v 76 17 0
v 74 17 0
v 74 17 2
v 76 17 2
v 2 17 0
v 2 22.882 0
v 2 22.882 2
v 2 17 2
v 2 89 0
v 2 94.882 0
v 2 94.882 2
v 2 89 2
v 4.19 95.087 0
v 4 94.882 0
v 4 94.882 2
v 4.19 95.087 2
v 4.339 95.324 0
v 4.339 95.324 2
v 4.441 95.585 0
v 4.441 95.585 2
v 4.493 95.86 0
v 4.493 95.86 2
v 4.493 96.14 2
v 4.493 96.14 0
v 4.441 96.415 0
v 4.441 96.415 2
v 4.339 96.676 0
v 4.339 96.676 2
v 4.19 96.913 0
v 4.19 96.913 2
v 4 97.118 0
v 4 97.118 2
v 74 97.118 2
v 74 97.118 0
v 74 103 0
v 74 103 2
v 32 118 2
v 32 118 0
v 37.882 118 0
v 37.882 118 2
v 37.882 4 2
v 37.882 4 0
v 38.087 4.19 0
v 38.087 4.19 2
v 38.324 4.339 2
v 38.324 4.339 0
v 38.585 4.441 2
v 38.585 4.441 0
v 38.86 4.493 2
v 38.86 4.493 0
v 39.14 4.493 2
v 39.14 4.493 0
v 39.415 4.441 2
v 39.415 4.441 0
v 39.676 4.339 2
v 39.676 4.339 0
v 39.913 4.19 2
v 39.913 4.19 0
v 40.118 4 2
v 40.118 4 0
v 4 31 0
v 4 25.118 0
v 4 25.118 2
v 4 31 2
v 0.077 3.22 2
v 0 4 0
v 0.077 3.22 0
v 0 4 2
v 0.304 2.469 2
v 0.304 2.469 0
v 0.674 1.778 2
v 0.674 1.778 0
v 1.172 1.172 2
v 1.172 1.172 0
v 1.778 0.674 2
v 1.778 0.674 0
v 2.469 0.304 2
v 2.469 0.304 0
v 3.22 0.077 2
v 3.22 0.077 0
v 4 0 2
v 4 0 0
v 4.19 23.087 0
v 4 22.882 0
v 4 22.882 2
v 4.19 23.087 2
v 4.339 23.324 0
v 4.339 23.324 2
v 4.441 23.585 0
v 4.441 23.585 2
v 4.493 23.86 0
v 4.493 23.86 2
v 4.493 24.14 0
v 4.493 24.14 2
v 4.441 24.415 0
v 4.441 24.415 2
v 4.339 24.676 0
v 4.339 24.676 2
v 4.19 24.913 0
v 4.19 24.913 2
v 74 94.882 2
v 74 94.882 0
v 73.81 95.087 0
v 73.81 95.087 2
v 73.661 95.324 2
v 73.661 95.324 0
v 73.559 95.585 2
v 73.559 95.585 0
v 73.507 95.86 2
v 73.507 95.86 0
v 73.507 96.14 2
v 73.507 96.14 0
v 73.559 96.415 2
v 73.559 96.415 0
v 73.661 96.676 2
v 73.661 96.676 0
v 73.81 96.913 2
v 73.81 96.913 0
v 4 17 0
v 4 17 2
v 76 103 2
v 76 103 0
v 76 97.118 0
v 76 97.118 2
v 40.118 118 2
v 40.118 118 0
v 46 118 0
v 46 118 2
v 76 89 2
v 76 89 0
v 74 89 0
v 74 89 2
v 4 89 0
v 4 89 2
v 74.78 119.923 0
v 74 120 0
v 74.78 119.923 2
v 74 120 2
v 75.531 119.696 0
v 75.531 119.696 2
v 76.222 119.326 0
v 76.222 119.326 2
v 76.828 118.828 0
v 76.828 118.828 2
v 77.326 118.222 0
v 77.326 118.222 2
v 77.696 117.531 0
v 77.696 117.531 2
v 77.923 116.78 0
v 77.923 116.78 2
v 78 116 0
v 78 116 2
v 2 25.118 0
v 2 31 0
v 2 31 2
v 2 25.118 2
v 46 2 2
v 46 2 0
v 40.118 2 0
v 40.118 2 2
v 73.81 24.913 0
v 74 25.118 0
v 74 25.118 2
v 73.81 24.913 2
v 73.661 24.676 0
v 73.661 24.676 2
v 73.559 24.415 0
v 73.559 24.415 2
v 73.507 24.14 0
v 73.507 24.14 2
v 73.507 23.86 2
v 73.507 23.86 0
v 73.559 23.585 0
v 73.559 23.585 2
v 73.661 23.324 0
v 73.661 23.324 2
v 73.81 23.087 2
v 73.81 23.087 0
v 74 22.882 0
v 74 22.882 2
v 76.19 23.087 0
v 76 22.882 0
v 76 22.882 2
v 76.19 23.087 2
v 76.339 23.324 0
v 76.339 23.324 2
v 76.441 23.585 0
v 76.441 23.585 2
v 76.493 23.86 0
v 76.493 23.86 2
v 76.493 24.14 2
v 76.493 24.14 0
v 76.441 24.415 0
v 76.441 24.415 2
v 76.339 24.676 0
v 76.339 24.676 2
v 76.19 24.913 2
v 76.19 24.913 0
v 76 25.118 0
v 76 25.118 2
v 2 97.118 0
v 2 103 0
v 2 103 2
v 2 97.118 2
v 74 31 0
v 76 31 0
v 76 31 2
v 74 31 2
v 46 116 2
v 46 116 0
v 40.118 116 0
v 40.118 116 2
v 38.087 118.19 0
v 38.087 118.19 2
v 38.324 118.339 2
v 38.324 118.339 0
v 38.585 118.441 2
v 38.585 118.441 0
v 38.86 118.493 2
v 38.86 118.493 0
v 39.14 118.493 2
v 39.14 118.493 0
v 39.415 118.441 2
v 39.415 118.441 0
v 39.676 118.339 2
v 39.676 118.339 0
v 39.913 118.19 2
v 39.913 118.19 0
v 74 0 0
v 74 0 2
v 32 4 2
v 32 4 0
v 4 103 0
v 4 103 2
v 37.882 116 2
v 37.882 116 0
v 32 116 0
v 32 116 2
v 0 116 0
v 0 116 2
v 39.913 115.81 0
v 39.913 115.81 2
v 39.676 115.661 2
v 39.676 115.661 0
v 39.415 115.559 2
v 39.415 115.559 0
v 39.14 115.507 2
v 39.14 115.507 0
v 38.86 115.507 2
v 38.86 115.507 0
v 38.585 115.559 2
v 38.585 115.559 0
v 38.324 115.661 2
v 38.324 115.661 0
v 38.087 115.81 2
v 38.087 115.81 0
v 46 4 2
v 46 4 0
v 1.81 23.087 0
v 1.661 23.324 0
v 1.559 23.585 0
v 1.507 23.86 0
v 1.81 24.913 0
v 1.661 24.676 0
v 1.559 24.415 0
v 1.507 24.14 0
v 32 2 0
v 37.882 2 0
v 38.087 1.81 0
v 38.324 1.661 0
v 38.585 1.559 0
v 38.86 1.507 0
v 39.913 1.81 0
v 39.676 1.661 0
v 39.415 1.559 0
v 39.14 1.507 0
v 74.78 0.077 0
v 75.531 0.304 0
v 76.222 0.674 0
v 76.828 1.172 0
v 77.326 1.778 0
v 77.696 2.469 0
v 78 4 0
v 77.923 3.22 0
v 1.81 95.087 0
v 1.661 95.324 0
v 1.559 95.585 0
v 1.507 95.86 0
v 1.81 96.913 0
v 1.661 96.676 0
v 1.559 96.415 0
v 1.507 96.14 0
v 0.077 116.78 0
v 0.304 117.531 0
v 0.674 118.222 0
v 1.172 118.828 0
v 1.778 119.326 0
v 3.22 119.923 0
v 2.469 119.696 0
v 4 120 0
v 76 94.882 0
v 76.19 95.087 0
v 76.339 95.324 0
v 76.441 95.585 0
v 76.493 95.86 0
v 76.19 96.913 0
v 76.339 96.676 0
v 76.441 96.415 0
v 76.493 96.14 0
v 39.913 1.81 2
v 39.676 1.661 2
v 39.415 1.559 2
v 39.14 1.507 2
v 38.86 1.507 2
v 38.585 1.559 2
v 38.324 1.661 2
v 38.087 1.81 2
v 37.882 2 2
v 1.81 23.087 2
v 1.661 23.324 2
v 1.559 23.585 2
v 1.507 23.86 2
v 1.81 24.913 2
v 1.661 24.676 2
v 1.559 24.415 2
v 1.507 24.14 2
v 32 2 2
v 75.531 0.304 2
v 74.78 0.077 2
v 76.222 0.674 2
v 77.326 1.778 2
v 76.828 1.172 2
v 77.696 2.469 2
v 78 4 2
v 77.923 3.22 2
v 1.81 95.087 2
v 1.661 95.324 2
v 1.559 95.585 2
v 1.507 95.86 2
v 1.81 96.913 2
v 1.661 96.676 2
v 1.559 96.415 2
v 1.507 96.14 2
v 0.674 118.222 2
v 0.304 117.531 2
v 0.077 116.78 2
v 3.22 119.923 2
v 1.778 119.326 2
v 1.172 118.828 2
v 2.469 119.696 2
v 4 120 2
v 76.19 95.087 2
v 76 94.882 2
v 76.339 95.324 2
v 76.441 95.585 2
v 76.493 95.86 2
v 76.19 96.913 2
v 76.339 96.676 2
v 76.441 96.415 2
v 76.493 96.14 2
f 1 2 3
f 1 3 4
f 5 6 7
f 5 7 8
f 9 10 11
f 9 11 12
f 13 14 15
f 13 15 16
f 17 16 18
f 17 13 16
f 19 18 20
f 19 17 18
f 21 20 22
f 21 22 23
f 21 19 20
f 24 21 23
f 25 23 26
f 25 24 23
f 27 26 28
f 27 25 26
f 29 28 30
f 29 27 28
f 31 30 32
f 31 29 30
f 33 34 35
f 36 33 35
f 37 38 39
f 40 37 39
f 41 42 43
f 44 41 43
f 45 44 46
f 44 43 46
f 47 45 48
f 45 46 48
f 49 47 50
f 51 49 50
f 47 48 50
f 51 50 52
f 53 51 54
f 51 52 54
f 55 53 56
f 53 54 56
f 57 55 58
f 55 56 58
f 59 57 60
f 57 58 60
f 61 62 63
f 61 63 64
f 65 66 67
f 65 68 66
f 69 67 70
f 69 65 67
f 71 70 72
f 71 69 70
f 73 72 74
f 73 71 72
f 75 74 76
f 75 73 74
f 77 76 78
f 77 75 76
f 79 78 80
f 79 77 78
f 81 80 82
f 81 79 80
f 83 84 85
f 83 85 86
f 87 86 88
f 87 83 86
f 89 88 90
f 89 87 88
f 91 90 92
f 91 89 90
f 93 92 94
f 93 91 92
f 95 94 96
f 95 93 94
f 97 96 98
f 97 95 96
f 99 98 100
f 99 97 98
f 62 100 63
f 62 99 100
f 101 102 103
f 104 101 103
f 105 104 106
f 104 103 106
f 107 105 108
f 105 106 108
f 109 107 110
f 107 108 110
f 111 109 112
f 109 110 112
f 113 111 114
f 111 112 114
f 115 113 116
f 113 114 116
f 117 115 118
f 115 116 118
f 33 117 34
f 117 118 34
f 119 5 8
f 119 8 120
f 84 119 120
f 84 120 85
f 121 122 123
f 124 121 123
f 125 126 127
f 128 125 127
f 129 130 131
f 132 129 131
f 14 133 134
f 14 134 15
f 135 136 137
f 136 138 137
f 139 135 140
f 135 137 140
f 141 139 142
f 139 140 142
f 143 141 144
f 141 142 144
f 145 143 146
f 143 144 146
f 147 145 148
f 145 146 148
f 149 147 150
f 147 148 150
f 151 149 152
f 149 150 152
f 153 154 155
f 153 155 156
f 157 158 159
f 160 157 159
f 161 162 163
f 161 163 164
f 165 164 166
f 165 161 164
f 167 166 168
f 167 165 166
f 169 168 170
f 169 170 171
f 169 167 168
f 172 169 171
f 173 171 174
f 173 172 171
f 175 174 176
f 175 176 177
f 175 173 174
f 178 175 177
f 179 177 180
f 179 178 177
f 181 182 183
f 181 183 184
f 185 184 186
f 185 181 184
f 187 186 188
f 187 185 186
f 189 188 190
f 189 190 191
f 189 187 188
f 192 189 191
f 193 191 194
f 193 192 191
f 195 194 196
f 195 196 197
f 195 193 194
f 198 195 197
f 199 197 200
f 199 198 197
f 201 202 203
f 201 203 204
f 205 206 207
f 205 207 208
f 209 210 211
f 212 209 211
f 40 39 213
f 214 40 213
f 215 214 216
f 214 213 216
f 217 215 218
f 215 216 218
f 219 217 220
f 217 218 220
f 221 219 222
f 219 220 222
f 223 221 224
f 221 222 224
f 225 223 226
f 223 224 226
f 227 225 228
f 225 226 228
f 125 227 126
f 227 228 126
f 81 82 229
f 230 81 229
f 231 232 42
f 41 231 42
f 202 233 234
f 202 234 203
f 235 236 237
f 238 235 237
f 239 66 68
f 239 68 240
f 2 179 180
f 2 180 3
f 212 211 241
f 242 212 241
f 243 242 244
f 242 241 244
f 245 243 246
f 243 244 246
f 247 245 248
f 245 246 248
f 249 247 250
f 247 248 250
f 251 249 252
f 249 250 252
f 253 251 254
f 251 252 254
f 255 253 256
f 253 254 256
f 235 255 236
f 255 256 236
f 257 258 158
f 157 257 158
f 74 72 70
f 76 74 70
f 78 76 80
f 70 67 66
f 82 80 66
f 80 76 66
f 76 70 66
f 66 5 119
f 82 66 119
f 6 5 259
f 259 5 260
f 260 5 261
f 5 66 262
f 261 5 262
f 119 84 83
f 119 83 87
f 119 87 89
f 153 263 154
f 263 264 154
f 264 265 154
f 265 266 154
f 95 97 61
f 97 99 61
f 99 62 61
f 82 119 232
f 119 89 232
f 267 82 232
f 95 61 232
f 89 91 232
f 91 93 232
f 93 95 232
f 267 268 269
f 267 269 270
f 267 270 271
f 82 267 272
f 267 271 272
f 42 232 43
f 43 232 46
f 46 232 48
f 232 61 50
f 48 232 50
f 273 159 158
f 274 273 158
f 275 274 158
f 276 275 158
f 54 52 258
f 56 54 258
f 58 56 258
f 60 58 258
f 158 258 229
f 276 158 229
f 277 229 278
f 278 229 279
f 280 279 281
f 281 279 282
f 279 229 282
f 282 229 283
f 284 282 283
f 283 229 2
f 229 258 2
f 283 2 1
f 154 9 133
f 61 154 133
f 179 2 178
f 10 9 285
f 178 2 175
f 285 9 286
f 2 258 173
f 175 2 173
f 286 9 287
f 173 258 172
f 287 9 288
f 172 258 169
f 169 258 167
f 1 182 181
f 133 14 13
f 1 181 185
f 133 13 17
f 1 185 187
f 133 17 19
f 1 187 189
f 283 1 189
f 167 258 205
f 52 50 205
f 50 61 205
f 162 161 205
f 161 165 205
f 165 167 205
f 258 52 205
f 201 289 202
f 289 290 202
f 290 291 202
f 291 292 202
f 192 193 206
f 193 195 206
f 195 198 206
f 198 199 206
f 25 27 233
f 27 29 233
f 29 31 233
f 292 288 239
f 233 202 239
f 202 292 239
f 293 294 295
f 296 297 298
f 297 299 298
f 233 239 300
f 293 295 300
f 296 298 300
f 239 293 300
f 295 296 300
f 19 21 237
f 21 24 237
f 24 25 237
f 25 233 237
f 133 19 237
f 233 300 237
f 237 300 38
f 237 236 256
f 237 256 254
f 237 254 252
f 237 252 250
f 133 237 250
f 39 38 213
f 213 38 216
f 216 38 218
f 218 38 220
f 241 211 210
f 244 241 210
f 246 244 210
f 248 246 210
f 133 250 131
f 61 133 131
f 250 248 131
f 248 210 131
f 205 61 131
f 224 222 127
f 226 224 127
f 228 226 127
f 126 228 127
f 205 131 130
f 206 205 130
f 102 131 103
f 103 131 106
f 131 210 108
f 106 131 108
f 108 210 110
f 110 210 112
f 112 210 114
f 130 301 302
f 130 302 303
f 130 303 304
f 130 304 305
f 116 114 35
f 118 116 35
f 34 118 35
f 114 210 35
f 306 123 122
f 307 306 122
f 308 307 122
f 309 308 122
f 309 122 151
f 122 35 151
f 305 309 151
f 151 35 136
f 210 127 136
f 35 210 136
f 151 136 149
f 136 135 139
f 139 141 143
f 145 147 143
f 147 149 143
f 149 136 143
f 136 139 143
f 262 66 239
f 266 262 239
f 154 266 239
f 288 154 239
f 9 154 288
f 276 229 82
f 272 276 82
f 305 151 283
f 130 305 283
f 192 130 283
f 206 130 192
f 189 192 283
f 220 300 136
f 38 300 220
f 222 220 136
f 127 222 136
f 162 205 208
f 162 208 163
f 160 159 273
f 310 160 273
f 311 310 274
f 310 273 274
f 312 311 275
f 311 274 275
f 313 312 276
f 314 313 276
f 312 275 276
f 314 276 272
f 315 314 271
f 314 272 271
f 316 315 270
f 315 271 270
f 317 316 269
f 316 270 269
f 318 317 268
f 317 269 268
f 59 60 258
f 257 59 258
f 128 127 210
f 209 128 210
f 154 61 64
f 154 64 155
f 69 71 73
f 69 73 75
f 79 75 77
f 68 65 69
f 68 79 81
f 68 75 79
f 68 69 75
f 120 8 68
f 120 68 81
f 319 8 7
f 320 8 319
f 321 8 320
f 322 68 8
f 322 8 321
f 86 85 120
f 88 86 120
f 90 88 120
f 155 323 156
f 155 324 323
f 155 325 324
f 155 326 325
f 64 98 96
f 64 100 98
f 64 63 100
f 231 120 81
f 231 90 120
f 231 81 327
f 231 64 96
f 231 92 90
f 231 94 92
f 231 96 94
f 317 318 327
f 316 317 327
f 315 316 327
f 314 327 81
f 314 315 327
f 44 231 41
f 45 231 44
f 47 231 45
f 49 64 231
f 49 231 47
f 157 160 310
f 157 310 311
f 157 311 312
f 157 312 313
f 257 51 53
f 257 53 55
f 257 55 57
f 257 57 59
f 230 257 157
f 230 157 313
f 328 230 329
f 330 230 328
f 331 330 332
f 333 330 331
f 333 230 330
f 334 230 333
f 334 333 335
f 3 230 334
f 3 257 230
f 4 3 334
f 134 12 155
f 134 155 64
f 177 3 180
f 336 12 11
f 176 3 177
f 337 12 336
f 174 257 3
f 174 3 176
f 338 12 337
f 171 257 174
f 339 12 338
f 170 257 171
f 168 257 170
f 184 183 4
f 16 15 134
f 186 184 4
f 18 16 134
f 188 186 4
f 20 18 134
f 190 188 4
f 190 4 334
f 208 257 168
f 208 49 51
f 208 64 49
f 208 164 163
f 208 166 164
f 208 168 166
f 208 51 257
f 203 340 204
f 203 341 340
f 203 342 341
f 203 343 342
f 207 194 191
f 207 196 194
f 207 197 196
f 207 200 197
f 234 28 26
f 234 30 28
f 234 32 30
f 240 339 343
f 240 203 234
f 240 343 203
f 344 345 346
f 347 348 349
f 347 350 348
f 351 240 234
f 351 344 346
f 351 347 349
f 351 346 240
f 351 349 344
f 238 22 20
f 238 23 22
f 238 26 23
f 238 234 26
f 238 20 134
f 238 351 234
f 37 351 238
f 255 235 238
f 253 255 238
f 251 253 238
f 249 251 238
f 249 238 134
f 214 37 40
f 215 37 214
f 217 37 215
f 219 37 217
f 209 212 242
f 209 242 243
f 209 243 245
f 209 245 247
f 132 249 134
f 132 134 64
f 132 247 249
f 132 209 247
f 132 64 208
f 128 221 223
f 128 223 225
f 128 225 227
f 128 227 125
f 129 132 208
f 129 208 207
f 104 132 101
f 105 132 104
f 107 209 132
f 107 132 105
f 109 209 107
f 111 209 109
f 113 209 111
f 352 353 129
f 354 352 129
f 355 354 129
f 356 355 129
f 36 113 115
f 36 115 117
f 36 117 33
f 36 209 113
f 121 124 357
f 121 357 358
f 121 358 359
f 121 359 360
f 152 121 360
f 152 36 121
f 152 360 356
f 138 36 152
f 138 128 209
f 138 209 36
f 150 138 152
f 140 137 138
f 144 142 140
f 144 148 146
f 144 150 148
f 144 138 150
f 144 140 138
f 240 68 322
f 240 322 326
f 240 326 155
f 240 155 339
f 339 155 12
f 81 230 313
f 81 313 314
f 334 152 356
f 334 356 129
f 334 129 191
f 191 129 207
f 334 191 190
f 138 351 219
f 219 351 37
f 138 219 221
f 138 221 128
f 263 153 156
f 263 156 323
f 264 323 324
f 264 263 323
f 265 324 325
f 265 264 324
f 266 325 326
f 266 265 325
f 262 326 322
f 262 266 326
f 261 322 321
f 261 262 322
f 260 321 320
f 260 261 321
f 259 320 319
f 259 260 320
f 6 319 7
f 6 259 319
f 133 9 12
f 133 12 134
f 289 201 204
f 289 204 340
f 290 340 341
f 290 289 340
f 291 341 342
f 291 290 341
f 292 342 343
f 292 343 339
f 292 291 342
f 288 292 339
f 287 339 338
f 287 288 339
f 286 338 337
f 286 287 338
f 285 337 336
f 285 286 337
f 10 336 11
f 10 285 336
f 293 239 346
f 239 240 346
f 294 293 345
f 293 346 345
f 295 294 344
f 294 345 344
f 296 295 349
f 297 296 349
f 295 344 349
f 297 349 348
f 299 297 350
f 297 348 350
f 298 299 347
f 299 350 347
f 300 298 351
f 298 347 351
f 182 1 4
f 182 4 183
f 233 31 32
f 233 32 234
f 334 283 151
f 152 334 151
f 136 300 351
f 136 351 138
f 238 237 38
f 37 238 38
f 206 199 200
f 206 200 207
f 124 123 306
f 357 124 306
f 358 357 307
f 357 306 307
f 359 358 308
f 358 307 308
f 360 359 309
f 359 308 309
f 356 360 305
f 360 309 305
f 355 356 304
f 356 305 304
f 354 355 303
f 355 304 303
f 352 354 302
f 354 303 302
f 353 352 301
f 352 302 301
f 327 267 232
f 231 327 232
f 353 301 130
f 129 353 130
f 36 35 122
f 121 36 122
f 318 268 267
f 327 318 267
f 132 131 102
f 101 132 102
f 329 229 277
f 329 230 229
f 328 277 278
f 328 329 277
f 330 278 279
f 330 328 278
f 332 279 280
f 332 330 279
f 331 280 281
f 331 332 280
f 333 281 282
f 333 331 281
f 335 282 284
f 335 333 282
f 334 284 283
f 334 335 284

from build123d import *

# Parameters (mm, degrees)
SKETCH1_W                  = 78
SKETCH1_H                  = 120
MAIN_SLIDER_BOTTOM_DEPTH   = 2
SLIDER_BOTTOM_CONTOURING_R = 4


with BuildPart() as part:
    # Sketch1 → Main Slider Bottom (new body)
    with BuildSketch(Plane.XY):
        with Locations((39, 60)):
            Rectangle(SKETCH1_W, SKETCH1_H)
        with BuildLine():
            Line((40.118033989, 4), (46, 4))
            Line((46, 4), (46, 2))
            Line((46, 2), (40.118033989, 2))
            ThreePointArc((40.118033989, 2), (39, 1.5), (37.881966011, 2))
            Line((37.881966011, 2), (32, 2))
            Line((32, 2), (32, 4))
            Line((32, 4), (37.881966011, 4))
            ThreePointArc((37.881966011, 4), (39, 4.5), (40.118033989, 4))
        make_face(mode=Mode.SUBTRACT)
        with BuildLine():
            Line((40.118033989, 118), (46, 118))
            Line((46, 118), (46, 116))
            Line((46, 116), (40.118033989, 116))
            ThreePointArc((40.118033989, 116), (39, 115.5), (37.881966011, 116))
            Line((37.881966011, 116), (32, 116))
            Line((32, 116), (32, 118))
            Line((32, 118), (37.881966011, 118))
            ThreePointArc((37.881966011, 118), (39, 118.5), (40.118033989, 118))
        make_face(mode=Mode.SUBTRACT)
        with BuildLine():
            Line((74, 97.118033989), (74, 103))
            Line((74, 103), (76, 103))
            Line((76, 103), (76, 97.118033989))
            ThreePointArc((76, 97.118033989), (76.5, 96), (76, 94.881966011))
            Line((76, 94.881966011), (76, 89))
            Line((76, 89), (74, 89))
            Line((74, 89), (74, 94.881966011))
            ThreePointArc((74, 94.881966011), (73.5, 96), (74, 97.118033989))
        make_face(mode=Mode.SUBTRACT)
        with BuildLine():
            Line((4, 97.118033989), (4, 103))
            Line((4, 103), (2, 103))
            Line((2, 103), (2, 97.118033989))
            ThreePointArc((2, 97.118033989), (1.5, 96), (2, 94.881966011))
            Line((2, 94.881966011), (2, 89))
            Line((2, 89), (4, 89))
            Line((4, 89), (4, 94.881966011))
            ThreePointArc((4, 94.881966011), (4.5, 96), (4, 97.118033989))
        make_face(mode=Mode.SUBTRACT)
        with BuildLine():
            Line((2, 22.881966011), (2, 17))
            Line((2, 17), (4, 17))
            Line((4, 17), (4, 22.881966011))
            ThreePointArc((4, 22.881966011), (4.5, 24), (4, 25.118033989))
            Line((4, 25.118033989), (4, 31))
            Line((4, 31), (2, 31))
            Line((2, 31), (2, 25.118033989))
            ThreePointArc((2, 25.118033989), (1.5, 24), (2, 22.881966011))
        make_face(mode=Mode.SUBTRACT)
        with BuildLine():
            Line((74, 22.881966011), (74, 17))
            Line((74, 17), (76, 17))
            Line((76, 17), (76, 22.881966011))
            ThreePointArc((76, 22.881966011), (76.5, 24), (76, 25.118033989))
            Line((76, 25.118033989), (76, 31))
            Line((76, 31), (74, 31))
            Line((74, 31), (74, 25.118033989))
            ThreePointArc((74, 25.118033989), (73.5, 24), (74, 22.881966011))
        make_face(mode=Mode.SUBTRACT)
    extrude(amount=MAIN_SLIDER_BOTTOM_DEPTH)

    # Slider Bottom Contouring
    slider_bottom_contouring_edges = [part.edges().sort_by_distance(p)[0] for p in [
        (0, 120, 1),
        (78, 120, 1),
        (78, 0, 1),
        (0, 0, 1),
    ]]
    fillet(slider_bottom_contouring_edges, radius=SLIDER_BOTTOM_CONTOURING_R)


solid = part.part
